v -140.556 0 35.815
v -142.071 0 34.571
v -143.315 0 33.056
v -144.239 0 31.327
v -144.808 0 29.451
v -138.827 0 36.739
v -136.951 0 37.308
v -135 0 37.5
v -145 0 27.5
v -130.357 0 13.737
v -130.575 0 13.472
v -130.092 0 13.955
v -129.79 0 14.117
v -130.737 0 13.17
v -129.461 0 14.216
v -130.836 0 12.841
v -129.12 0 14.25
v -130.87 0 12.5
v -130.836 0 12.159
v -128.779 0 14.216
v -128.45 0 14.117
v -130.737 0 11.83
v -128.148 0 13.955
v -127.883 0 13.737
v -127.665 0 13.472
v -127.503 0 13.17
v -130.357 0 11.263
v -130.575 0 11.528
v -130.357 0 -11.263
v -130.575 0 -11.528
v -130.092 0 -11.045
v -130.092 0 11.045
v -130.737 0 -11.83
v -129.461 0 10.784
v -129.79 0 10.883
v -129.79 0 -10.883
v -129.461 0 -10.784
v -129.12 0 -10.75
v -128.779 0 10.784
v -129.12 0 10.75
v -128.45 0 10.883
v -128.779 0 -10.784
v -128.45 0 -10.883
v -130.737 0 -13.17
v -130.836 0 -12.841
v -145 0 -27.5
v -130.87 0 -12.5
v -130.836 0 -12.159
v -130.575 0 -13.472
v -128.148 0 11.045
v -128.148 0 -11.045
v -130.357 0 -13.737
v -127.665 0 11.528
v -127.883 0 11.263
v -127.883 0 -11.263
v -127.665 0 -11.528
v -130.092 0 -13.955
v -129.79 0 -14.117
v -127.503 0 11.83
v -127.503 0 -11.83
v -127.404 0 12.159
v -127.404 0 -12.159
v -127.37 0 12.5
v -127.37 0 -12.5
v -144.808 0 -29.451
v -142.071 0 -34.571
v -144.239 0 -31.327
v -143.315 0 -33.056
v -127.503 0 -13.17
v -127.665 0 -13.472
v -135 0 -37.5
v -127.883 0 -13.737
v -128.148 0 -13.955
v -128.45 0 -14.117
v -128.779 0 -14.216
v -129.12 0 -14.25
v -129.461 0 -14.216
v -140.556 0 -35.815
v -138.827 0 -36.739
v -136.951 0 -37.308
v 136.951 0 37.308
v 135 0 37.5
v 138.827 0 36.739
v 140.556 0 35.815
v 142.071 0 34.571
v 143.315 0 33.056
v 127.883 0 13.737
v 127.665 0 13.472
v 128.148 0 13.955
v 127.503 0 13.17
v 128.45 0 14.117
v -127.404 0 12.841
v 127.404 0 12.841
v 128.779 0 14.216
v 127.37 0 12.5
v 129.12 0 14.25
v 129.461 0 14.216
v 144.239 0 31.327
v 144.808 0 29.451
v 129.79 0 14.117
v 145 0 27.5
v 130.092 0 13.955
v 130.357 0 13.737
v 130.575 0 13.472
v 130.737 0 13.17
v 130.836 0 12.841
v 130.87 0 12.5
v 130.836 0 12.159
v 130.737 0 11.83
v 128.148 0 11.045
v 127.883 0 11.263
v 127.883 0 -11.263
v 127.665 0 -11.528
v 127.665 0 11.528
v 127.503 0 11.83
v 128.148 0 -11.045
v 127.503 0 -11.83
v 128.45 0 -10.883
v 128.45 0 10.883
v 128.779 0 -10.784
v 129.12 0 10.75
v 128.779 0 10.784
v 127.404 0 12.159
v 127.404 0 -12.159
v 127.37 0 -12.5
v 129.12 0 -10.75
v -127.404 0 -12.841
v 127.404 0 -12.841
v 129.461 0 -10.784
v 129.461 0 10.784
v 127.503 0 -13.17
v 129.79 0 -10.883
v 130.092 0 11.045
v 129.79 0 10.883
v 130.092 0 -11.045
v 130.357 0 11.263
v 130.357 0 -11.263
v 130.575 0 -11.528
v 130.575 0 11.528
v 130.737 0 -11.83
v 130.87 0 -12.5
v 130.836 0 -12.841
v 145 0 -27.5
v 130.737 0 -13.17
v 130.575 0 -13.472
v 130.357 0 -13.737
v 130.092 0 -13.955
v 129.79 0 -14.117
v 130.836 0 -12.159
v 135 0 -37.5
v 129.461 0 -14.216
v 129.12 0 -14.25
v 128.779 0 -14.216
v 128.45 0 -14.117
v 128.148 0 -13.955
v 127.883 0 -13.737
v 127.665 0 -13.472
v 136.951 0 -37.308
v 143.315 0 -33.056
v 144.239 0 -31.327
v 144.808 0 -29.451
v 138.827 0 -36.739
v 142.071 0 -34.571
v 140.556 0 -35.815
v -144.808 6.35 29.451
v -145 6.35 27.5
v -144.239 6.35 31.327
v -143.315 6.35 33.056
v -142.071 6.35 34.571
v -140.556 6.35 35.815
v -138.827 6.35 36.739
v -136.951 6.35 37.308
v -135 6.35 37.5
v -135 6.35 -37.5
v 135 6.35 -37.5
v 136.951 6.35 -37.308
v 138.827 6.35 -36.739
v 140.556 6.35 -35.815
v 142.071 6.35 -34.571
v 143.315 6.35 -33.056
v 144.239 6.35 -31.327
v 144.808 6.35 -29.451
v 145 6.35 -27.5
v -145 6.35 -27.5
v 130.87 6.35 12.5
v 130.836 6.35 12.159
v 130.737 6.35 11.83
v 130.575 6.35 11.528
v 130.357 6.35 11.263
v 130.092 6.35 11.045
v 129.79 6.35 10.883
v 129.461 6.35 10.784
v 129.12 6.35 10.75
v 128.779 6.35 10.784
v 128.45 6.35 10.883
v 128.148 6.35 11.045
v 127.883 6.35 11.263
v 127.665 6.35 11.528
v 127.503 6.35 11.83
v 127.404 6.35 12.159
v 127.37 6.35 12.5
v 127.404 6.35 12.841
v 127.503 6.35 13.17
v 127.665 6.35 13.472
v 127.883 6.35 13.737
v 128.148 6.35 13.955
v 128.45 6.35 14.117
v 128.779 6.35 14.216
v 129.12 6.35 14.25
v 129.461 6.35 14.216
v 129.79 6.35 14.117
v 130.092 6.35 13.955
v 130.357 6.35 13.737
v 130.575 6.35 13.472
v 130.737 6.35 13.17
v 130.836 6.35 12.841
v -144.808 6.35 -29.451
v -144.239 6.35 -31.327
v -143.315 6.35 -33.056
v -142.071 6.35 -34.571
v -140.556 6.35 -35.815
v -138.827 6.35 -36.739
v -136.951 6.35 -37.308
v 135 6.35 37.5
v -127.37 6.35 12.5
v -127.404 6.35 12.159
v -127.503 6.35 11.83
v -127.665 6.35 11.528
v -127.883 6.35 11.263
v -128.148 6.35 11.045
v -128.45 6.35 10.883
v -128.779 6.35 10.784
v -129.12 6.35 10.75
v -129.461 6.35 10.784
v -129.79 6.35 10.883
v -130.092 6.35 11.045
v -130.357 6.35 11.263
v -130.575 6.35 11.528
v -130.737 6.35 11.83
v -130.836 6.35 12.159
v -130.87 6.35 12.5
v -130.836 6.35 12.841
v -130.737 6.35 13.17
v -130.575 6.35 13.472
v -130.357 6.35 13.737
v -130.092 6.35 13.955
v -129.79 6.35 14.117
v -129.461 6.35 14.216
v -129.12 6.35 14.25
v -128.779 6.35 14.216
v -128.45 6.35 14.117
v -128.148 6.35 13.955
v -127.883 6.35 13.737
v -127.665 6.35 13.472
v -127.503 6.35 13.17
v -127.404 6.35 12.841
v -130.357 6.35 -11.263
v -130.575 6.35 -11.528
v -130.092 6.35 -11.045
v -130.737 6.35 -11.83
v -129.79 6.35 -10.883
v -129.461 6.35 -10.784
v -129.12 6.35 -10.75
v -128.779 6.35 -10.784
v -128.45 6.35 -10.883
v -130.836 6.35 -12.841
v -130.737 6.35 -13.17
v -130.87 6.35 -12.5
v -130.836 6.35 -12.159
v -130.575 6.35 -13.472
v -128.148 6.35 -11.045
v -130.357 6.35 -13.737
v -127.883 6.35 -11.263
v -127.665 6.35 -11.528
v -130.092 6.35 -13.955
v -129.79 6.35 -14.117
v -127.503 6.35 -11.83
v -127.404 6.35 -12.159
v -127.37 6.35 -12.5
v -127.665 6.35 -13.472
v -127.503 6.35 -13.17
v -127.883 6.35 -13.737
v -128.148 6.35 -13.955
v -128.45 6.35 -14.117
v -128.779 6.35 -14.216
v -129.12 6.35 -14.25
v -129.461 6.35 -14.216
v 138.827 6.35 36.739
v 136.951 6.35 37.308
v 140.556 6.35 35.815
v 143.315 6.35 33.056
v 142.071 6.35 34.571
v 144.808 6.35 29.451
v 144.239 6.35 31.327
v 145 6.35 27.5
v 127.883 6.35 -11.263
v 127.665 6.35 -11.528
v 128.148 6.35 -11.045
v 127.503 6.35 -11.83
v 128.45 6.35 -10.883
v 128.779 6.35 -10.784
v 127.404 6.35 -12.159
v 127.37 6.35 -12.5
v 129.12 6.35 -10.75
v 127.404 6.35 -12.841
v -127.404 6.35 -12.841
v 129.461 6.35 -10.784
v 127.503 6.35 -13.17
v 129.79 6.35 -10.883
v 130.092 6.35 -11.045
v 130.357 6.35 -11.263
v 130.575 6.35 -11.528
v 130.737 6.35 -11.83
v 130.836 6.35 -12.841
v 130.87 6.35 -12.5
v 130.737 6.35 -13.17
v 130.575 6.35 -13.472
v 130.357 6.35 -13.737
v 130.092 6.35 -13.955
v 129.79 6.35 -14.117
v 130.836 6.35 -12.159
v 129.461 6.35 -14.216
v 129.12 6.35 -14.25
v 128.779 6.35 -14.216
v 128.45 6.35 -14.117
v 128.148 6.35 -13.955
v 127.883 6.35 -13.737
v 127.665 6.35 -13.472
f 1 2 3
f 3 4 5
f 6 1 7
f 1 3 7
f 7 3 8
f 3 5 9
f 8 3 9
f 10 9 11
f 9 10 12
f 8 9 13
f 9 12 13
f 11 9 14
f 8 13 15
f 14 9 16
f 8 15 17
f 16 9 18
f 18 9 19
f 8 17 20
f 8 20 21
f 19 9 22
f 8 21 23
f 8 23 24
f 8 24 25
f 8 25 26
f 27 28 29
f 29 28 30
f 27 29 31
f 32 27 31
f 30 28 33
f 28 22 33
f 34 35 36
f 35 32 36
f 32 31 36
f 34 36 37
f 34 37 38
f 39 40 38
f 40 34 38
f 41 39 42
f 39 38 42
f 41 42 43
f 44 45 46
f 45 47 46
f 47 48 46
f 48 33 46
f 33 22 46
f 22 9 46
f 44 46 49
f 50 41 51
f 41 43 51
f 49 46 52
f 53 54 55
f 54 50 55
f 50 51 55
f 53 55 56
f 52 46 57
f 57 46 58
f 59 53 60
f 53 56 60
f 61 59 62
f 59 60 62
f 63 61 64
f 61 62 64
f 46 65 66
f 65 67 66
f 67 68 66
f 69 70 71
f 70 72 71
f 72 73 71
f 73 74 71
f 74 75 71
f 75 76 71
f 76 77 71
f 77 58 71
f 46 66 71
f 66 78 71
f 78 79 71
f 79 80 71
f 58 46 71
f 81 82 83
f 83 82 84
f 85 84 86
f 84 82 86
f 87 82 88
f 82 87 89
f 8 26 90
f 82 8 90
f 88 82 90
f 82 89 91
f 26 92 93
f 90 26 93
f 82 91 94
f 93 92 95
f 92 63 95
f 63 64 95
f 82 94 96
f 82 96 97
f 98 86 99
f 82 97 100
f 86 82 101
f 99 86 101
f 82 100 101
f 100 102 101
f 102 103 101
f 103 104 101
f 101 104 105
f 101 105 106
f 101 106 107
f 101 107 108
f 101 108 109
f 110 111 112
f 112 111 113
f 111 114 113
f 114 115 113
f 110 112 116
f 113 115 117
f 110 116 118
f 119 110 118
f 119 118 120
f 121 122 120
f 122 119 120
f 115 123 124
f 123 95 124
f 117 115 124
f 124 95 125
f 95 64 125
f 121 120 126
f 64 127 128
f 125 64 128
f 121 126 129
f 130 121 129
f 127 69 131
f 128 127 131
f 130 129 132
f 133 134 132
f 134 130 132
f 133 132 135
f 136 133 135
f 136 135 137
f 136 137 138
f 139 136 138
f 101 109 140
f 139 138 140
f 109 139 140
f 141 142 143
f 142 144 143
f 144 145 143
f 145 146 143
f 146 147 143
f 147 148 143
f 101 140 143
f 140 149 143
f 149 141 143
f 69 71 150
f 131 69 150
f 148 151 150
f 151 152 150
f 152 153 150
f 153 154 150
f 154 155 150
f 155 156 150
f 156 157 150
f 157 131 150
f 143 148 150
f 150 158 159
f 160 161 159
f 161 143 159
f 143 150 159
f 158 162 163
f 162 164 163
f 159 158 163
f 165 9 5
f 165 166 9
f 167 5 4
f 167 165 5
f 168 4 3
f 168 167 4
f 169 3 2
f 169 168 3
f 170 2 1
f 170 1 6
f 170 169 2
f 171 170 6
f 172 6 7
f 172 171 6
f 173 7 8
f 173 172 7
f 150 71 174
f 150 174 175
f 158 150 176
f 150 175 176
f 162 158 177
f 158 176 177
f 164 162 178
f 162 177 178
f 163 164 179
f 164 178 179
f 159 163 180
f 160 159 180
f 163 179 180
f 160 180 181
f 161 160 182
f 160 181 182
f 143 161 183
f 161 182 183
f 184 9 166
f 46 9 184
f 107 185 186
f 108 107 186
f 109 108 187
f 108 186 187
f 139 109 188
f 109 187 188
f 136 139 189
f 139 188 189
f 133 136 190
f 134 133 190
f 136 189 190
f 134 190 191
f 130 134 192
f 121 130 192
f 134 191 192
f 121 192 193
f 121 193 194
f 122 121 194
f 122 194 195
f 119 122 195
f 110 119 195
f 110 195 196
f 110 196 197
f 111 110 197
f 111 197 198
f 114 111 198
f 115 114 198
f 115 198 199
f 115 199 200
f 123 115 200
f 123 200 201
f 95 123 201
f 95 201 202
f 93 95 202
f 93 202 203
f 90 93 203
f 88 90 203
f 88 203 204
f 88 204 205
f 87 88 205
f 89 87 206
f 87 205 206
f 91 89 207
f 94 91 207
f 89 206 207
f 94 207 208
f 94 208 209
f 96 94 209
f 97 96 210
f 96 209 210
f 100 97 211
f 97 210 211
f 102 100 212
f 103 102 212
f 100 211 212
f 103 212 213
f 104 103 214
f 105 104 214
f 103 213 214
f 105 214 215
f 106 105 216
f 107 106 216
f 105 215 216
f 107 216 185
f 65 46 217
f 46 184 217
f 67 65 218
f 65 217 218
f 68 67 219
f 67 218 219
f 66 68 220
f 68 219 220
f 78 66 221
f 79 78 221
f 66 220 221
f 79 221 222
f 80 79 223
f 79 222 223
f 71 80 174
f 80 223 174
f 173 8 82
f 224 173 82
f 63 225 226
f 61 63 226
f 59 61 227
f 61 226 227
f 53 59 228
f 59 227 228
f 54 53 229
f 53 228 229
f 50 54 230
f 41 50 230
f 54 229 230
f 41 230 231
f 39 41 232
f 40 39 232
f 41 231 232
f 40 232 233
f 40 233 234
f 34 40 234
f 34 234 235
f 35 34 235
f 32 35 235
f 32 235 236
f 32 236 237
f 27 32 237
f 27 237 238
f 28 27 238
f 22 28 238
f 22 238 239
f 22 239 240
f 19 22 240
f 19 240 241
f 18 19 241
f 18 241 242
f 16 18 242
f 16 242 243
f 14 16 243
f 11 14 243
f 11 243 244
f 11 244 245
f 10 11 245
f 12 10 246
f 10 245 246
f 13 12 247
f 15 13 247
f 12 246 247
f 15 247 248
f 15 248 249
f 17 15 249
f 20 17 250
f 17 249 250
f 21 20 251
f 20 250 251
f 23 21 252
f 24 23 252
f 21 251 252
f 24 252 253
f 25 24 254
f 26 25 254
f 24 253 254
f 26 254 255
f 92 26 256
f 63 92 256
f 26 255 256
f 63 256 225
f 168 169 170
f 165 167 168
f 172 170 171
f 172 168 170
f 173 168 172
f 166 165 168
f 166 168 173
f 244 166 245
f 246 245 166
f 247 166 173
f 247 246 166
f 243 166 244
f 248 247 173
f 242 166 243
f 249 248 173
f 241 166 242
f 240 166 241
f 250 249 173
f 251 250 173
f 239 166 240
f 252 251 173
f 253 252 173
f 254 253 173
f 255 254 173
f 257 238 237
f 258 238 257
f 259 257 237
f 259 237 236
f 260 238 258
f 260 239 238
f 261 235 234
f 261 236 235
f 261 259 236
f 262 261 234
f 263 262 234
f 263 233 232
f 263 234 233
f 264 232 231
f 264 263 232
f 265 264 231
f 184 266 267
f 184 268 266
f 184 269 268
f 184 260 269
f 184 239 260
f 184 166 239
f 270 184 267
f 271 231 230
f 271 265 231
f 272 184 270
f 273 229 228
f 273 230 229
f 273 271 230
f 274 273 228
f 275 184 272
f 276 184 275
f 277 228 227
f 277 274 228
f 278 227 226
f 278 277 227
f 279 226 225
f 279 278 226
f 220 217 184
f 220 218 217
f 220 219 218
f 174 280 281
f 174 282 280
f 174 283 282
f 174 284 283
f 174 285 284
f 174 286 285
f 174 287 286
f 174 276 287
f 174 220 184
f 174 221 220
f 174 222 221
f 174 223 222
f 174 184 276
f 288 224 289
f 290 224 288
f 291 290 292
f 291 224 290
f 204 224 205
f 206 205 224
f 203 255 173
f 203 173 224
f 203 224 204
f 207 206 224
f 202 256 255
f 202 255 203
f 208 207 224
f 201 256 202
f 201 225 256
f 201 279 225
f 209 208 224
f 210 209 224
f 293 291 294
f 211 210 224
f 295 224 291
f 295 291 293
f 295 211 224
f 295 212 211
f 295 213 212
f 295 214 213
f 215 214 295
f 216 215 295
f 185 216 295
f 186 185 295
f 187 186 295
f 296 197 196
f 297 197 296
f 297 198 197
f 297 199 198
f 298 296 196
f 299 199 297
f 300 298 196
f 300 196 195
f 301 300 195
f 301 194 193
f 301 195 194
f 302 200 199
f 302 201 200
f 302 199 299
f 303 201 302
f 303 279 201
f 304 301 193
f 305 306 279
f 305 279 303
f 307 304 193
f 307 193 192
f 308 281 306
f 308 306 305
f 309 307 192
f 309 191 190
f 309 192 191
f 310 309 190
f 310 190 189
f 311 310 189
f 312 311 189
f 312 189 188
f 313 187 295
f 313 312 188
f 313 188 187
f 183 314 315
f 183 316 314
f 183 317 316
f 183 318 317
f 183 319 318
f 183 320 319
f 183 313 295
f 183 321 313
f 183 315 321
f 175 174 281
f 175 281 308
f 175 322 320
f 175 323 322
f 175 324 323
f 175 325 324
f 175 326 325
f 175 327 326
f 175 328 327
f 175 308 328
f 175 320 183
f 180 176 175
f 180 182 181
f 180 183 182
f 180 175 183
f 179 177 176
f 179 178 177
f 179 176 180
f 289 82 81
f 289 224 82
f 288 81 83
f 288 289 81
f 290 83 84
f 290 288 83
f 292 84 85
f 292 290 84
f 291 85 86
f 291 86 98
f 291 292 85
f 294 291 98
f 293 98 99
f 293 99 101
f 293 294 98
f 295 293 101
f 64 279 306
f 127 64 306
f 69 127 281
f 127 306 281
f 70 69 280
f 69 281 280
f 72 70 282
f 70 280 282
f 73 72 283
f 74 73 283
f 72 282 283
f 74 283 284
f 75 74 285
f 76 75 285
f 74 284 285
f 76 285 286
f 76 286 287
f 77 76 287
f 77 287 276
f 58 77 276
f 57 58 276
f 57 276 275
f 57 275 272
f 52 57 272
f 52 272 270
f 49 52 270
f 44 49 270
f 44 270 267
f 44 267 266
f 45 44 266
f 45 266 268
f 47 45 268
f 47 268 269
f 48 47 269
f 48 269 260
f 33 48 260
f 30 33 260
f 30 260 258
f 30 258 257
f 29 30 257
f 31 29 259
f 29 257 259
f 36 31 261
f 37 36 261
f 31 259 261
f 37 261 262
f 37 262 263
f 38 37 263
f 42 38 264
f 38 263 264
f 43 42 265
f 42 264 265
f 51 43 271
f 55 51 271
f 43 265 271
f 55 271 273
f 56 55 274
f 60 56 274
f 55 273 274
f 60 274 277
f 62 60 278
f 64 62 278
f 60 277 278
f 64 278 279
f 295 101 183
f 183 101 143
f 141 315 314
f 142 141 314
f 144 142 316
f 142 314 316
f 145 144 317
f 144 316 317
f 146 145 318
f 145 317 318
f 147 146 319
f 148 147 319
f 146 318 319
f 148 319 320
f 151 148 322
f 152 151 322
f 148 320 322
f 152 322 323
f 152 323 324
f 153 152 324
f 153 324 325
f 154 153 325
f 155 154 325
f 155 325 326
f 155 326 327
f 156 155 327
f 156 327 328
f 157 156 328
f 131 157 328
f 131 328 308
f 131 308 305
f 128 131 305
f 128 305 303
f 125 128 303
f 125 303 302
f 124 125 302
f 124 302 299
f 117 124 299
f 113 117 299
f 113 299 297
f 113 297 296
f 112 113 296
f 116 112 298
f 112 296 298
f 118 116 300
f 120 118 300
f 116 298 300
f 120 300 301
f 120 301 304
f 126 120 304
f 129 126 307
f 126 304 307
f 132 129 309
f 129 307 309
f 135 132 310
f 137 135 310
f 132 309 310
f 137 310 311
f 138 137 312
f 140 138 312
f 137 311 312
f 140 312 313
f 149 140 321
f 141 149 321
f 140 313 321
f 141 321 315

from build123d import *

# Parameters (mm, degrees)
SKETCH1_W           = 290
SKETCH1_H           = 75
BOSS_EXTRUDE1_DEPTH = 6.35
SKETCH3_R           = 1.75
CUT_EXTRUDE2_DEPTH  = 7.35
FILLET1_R           = 10
SKETCH4_R           = 1.75
CUT_EXTRUDE3_DEPTH  = 7.35
LPATTERN1_COUNT     = 2
LPATTERN1_PITCH     = 25


with BuildPart() as part:
    # Sketch1 → Boss-Extrude1 (new body)
    with BuildSketch(Plane(origin=(0, 0, 0), x_dir=(1, 0, 0), z_dir=(0, 1, 0))):
        Rectangle(SKETCH1_W, SKETCH1_H)
    extrude(amount=BOSS_EXTRUDE1_DEPTH)

    # Sketch3 → Cut-Extrude2 (cut, through all)
    with BuildSketch(Plane(origin=(0, 6.35, 0), x_dir=(1, 0, 0), z_dir=(0, 1, 0))):
        with Locations((129.12, 12.5)):
            Circle(SKETCH3_R)
    cut_extrude2 = extrude(amount=-CUT_EXTRUDE2_DEPTH, mode=Mode.SUBTRACT)

    # Fillet1
    fillet1_edges = [part.edges().sort_by_distance(p)[0] for p in [
        (145, 3.175, 37.5),
        (-145, 3.175, 37.5),
        (-145, 3.175, -37.5),
        (145, 3.175, -37.5),
    ]]
    fillet(fillet1_edges, radius=FILLET1_R)

    # Sketch4 → Cut-Extrude3 (cut, through all)
    with BuildSketch(Plane(origin=(0, 6.35, 0), x_dir=(1, 0, 0), z_dir=(0, 1, 0))):
        with Locations((-129.12, 12.5)):
            Circle(SKETCH4_R)
    cut_extrude3 = extrude(amount=-CUT_EXTRUDE3_DEPTH, mode=Mode.SUBTRACT)

    # LPattern1: Cut-Extrude2, Cut-Extrude3 ×2
    with Locations(*[(0, 0, i * LPATTERN1_PITCH) for i in range(1, LPATTERN1_COUNT)]):
        add(cut_extrude2, mode=Mode.SUBTRACT)
        add(cut_extrude3, mode=Mode.SUBTRACT)


solid = part.part
